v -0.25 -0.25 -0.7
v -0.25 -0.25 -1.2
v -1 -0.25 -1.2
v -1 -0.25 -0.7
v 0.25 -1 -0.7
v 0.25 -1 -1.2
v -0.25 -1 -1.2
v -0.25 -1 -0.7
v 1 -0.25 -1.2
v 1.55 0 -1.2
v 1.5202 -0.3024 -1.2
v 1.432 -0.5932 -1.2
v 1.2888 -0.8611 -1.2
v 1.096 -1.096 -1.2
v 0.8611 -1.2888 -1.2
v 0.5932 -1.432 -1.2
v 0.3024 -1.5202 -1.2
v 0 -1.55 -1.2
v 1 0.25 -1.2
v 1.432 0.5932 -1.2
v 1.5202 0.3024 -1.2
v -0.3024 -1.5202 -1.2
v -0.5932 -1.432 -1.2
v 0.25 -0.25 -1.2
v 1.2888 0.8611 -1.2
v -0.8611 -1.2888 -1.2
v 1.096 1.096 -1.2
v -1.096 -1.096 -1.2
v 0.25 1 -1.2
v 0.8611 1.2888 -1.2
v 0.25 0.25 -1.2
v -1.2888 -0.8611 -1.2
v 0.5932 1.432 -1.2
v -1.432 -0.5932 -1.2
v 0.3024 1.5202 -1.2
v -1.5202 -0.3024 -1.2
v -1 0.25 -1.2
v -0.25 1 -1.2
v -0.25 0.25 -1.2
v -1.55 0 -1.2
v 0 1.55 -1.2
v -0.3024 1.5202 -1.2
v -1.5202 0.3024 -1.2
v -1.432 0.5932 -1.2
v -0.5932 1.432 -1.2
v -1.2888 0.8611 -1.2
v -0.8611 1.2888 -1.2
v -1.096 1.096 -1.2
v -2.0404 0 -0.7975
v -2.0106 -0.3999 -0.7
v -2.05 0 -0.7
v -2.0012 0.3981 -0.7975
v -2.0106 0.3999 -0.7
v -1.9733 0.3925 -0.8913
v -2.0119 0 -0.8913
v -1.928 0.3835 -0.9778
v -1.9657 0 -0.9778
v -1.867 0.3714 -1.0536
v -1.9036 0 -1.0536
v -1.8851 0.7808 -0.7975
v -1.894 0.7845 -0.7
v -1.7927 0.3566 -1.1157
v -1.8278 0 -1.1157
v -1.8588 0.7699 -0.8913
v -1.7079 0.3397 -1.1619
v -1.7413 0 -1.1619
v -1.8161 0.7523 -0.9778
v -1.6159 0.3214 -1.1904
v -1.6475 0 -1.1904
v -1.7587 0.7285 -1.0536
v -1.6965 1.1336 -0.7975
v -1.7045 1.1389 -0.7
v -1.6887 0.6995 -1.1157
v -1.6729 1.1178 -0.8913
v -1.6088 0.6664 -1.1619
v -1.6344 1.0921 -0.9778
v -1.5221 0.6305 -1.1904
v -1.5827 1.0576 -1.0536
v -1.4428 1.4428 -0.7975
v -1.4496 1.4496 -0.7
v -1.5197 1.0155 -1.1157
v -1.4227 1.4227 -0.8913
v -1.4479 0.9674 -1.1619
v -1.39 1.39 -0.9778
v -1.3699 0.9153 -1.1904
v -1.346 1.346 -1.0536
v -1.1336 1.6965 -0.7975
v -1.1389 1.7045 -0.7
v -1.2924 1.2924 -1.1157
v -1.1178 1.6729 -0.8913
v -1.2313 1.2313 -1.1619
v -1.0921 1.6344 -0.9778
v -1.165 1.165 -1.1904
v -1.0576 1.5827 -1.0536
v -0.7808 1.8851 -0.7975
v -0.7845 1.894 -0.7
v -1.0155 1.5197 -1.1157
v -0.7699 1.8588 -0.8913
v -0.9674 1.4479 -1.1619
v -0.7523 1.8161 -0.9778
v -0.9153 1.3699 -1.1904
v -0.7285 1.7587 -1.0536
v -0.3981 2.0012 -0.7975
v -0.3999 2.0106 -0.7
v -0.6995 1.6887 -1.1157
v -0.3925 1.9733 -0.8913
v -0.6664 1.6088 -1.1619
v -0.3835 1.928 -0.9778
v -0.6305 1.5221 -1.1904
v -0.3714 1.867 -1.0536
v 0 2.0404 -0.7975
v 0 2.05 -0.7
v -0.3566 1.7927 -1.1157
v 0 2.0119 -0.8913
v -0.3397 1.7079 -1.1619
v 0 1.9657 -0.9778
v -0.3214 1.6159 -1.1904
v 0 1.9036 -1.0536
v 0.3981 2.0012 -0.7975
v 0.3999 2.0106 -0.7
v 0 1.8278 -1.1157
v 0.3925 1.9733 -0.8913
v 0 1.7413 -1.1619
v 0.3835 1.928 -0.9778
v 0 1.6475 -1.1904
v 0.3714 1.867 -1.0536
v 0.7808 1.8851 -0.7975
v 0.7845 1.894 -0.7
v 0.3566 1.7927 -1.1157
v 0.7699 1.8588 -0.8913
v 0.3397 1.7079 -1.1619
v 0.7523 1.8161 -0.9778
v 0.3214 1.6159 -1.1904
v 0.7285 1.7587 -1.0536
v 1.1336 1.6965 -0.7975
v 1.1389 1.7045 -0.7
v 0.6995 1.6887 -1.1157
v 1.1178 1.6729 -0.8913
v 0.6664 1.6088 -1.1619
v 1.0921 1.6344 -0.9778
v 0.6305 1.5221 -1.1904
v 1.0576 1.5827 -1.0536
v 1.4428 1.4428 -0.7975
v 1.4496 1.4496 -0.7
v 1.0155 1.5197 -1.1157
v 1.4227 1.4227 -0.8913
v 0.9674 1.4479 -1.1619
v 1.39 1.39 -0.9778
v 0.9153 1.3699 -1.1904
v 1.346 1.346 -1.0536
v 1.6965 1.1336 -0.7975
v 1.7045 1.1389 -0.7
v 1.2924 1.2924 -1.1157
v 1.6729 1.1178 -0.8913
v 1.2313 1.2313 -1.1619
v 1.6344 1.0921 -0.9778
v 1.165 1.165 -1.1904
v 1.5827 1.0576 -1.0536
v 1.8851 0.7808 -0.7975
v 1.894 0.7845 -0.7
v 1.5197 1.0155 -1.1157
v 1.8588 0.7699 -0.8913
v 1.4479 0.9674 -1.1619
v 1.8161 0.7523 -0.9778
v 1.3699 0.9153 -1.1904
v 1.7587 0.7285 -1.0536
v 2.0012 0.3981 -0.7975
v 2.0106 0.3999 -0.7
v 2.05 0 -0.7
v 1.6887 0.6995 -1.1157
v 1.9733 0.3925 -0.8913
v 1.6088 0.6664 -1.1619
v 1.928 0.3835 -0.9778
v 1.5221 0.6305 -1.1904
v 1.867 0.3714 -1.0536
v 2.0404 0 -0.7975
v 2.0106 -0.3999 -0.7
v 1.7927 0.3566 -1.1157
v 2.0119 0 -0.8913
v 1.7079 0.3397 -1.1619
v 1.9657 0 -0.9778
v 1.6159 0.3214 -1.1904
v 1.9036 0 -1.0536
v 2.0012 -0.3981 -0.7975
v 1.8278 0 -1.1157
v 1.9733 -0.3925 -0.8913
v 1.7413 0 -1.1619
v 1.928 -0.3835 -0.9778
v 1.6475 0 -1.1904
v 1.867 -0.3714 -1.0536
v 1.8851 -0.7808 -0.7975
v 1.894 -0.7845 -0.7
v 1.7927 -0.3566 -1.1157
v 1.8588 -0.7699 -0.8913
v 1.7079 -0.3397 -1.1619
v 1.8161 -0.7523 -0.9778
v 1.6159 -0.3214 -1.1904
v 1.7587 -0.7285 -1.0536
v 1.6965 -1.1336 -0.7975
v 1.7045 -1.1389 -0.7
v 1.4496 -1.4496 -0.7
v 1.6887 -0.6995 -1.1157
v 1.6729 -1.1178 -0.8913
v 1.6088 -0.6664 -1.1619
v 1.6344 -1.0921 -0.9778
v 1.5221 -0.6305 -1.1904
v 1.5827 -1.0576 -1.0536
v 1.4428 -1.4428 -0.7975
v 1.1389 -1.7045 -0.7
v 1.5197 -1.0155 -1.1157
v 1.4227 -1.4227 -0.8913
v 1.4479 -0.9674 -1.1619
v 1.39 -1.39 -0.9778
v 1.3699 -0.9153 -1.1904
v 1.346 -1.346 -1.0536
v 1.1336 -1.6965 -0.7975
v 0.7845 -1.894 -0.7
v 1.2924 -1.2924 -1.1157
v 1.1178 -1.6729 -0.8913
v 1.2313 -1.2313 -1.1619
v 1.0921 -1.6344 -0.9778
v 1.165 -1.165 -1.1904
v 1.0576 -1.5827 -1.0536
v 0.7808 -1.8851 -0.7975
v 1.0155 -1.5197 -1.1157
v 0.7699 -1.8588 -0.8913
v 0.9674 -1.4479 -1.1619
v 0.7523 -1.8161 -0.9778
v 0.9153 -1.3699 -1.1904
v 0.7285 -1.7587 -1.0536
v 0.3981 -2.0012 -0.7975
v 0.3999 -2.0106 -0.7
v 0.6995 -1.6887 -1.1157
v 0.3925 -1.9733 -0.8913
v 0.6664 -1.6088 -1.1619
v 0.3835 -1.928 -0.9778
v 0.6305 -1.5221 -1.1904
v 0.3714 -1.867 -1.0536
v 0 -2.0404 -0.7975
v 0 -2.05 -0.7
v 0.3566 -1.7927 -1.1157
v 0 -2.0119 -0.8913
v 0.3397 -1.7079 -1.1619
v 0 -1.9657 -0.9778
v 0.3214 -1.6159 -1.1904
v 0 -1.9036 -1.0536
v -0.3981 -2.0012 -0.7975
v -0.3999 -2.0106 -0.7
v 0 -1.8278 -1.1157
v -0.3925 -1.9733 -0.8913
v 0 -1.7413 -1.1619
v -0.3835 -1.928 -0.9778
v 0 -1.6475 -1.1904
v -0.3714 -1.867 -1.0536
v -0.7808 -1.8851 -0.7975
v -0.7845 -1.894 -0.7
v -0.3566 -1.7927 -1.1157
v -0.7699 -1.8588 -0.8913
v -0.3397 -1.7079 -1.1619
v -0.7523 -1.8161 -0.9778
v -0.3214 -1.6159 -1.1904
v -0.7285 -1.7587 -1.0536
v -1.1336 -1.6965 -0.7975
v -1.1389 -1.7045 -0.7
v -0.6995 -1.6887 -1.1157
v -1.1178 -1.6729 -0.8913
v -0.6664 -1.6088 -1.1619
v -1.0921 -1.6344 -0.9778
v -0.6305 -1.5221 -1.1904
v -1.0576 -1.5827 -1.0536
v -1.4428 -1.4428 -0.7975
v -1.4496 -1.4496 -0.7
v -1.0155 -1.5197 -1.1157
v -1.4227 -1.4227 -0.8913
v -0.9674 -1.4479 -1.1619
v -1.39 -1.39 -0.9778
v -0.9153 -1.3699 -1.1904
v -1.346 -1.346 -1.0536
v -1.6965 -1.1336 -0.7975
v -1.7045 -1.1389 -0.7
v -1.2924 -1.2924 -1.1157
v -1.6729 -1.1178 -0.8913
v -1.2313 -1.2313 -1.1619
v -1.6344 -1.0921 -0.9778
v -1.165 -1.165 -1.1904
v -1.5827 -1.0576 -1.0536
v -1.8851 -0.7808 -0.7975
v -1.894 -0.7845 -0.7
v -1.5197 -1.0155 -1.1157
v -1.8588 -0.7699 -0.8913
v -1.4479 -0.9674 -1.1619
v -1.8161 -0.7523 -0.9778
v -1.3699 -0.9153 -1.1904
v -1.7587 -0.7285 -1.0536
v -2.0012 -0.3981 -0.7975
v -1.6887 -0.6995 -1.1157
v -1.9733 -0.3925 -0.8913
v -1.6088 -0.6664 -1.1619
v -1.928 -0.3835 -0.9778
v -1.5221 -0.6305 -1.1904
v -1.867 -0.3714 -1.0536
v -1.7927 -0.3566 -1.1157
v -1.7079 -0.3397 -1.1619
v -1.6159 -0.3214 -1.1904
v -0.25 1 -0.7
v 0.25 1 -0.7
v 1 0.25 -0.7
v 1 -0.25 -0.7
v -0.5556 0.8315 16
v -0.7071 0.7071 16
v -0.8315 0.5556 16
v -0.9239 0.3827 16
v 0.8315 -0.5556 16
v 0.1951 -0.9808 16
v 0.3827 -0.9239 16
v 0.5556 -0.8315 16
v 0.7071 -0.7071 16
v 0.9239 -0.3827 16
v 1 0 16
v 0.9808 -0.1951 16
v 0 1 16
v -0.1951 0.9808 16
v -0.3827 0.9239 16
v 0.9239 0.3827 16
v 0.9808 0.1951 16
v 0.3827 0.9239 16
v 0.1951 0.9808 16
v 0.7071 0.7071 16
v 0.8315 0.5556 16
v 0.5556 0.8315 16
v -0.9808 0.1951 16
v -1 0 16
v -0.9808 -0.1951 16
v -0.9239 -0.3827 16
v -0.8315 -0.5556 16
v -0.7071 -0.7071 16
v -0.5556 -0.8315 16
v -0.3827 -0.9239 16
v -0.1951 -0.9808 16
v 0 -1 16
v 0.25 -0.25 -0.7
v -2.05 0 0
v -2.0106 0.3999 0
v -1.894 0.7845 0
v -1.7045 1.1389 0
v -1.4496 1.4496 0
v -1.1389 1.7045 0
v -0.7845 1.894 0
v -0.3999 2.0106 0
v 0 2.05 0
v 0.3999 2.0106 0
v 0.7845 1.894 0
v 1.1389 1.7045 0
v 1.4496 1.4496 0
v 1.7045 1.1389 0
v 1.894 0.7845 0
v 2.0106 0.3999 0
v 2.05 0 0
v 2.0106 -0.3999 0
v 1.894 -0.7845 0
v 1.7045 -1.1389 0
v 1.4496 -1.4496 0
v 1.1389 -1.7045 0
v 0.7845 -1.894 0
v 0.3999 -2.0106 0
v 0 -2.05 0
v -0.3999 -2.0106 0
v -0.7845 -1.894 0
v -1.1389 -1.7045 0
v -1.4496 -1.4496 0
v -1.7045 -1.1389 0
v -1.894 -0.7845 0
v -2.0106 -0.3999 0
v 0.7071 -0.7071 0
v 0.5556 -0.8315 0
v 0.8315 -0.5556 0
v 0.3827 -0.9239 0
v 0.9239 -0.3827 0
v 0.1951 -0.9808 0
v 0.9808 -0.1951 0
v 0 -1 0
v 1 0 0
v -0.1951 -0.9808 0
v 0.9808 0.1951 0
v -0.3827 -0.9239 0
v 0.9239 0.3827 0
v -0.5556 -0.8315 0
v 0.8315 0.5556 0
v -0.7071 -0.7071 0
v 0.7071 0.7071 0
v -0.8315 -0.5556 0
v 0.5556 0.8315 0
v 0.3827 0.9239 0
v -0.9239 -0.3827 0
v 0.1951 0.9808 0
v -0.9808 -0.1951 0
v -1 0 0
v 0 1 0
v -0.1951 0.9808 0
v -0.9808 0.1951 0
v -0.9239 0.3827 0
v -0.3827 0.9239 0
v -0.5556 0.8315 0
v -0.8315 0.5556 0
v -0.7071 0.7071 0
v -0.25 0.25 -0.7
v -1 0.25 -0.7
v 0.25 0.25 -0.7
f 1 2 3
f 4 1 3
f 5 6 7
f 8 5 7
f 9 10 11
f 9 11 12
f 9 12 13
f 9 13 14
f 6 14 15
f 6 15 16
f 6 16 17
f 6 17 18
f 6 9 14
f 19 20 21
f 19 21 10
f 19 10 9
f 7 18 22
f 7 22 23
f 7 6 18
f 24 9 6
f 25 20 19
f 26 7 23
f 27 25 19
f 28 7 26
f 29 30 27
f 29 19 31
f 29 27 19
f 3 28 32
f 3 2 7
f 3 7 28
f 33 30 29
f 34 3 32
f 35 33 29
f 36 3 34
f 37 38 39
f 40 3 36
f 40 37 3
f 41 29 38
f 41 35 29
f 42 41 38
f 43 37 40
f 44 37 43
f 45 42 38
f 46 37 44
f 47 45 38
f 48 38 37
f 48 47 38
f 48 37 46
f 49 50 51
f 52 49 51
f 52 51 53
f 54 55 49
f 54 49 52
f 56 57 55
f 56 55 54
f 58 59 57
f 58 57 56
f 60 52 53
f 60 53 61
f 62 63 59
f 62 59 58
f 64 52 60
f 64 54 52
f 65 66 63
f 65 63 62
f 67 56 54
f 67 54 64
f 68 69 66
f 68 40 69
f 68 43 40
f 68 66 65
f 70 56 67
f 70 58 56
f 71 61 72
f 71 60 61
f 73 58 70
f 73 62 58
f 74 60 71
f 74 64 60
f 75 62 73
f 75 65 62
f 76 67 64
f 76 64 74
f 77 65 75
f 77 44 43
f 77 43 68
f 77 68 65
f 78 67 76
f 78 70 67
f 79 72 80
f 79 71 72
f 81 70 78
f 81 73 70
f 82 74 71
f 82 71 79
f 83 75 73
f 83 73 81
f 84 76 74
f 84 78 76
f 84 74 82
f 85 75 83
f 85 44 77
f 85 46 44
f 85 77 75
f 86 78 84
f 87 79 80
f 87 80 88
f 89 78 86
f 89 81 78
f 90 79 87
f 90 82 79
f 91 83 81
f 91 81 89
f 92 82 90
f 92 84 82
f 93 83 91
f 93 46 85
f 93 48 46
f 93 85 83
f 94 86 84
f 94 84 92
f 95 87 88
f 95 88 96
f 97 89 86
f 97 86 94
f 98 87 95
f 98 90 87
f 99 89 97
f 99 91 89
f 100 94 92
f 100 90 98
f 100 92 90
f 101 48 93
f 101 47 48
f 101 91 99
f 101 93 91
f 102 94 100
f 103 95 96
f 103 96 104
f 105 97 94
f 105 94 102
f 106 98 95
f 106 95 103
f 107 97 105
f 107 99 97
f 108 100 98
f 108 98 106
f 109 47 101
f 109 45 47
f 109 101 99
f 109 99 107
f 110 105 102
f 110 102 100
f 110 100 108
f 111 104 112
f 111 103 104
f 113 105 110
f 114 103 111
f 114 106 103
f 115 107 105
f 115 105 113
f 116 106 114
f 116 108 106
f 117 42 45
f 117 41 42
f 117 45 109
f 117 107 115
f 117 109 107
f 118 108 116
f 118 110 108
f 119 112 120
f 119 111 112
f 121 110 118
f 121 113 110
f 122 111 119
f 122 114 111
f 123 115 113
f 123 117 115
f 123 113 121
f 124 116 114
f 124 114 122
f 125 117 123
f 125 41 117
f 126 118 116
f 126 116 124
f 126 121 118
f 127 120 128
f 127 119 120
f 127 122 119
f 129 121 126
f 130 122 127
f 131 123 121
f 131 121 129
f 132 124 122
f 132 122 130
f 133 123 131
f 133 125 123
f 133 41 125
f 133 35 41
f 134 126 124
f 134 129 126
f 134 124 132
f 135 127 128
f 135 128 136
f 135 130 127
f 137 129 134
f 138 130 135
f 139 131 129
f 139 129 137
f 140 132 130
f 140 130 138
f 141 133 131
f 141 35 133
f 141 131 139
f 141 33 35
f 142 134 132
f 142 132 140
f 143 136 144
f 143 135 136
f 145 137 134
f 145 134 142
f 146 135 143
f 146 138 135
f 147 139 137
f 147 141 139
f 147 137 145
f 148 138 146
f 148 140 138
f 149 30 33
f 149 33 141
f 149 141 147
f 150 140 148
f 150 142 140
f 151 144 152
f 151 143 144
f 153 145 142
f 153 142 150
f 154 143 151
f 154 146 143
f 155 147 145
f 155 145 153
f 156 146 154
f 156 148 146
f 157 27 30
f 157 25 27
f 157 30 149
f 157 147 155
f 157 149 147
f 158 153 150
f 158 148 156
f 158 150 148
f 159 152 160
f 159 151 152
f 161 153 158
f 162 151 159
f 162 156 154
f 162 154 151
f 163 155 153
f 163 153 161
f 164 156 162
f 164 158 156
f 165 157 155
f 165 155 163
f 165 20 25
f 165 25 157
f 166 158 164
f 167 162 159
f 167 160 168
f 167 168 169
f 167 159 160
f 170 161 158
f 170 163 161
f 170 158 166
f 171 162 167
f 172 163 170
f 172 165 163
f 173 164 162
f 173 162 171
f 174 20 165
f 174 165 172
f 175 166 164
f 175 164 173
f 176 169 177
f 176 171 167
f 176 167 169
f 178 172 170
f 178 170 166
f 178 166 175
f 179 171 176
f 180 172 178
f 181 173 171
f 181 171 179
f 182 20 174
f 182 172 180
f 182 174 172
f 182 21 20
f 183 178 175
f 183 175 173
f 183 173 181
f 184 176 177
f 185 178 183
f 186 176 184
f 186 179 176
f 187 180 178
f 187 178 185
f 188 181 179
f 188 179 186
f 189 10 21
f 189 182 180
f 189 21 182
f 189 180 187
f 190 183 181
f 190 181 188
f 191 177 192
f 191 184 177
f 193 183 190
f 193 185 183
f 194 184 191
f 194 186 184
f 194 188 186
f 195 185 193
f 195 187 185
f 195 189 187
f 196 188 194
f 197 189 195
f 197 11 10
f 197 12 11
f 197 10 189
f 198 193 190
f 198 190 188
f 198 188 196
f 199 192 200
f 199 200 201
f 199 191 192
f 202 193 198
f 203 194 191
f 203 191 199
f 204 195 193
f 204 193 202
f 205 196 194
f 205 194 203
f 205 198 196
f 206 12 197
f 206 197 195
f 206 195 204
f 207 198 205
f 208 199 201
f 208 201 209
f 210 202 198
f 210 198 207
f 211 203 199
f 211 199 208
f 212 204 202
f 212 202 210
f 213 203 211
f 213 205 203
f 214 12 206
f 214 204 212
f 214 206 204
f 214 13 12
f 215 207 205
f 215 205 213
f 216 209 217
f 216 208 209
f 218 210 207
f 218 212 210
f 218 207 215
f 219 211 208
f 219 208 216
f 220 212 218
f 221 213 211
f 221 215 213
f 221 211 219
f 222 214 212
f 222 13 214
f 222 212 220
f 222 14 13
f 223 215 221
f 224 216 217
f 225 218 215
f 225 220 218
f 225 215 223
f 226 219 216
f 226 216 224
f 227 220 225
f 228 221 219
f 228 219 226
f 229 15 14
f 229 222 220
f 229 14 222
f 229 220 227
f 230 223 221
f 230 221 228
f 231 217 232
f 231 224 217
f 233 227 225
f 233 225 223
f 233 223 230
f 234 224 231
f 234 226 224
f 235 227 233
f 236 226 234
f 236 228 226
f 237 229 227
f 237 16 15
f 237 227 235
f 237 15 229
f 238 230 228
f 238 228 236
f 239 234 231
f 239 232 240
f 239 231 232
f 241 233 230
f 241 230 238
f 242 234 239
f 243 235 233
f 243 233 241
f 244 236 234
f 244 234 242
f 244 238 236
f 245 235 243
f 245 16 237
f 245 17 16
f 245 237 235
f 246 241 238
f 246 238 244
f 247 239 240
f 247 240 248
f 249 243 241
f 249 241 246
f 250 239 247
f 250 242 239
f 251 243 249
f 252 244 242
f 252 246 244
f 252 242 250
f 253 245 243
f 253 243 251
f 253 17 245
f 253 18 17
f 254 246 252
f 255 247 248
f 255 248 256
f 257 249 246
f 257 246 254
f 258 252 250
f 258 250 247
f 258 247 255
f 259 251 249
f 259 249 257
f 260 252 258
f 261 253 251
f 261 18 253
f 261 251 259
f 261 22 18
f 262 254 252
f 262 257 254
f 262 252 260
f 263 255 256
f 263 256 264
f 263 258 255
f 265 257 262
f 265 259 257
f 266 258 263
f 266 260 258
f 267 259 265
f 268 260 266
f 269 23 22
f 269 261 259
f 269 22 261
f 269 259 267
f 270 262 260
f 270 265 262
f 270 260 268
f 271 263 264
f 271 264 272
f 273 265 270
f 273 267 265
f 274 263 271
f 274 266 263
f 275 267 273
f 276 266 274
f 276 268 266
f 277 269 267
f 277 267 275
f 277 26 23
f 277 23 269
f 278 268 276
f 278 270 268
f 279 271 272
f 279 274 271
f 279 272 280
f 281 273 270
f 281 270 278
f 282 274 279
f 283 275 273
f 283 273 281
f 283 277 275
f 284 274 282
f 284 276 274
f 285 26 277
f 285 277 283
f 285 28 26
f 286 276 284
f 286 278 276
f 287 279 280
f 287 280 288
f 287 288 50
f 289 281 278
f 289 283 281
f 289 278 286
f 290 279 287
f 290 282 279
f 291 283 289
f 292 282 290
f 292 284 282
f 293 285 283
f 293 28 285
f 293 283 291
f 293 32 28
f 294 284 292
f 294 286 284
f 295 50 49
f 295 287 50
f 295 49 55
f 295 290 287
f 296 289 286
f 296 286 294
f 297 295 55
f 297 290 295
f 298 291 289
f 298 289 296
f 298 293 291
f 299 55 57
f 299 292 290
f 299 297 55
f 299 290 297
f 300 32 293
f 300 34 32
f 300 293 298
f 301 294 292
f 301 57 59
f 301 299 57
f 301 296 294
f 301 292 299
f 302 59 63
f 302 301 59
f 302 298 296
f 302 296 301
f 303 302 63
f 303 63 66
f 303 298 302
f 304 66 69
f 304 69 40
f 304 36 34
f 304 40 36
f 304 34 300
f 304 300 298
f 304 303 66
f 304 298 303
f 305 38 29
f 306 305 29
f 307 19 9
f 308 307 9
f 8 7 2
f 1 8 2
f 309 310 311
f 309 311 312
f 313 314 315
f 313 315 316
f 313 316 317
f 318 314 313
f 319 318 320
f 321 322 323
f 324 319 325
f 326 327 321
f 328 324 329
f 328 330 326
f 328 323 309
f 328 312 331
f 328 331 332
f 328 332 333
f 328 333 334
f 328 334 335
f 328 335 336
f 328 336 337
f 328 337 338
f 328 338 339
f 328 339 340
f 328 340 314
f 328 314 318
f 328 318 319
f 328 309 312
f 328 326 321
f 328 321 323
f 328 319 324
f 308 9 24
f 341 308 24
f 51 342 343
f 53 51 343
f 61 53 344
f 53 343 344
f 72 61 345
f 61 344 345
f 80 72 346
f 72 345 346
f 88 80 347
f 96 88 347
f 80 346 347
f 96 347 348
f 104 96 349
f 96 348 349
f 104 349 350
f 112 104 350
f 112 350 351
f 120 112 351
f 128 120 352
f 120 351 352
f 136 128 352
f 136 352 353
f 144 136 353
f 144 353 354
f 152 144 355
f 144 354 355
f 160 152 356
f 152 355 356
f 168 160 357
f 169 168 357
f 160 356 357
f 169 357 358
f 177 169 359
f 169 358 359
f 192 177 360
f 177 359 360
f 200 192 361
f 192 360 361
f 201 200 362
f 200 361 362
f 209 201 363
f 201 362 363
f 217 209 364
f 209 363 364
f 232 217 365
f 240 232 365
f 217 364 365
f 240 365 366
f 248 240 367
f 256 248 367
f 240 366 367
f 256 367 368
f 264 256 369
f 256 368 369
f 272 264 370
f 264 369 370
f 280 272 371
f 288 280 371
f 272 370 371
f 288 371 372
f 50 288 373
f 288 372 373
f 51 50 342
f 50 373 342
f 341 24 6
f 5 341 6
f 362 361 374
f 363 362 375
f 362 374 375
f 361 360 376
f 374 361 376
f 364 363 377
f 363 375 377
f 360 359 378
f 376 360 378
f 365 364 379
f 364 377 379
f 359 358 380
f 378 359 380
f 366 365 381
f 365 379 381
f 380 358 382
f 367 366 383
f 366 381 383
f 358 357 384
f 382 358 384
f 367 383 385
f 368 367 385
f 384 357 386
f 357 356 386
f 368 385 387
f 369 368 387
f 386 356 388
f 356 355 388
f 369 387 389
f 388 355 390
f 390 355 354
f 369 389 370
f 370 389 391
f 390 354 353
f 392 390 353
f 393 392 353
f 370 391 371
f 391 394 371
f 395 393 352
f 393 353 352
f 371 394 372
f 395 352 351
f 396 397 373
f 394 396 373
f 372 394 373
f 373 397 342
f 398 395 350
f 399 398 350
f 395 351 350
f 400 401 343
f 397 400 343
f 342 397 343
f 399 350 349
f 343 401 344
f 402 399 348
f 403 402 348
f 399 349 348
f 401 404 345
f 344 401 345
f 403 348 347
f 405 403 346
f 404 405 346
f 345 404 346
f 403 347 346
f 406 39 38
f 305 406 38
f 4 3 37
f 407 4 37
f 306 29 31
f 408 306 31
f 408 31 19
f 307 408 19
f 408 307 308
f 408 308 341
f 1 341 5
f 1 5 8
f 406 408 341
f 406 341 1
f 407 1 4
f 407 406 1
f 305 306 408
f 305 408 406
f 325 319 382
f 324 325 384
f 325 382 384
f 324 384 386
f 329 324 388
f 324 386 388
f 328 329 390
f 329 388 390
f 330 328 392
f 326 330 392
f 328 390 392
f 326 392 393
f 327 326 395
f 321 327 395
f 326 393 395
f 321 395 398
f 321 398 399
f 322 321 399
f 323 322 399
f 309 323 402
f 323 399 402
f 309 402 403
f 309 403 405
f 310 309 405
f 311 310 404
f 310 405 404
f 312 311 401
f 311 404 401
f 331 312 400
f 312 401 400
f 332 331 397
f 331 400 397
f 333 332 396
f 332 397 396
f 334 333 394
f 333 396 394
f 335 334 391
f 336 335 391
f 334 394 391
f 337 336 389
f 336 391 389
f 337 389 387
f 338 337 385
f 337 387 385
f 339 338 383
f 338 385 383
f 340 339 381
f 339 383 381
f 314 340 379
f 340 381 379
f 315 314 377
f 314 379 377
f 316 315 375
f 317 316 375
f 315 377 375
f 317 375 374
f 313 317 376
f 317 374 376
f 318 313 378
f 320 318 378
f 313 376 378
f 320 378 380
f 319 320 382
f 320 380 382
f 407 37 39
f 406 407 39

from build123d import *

# Parameters (mm, degrees)
SCHIZZO1_R                   = 1
ESTRUSIONE_ESTRUSIONE1_DEPTH = 16
SCHIZZO2_R                   = 2.05
ESTRUSIONE_ESTRUSIONE2_DEPTH = 1.2
RACCORDO1_R                  = 0.5
TAGLIO_ESTRUSIONE1_DEPTH     = 0.5


with BuildPart() as part:
    # Schizzo1 → Estrusione-Estrusione1 (new body)
    with BuildSketch(Plane.XY):
        Circle(SCHIZZO1_R)
    extrude(amount=ESTRUSIONE_ESTRUSIONE1_DEPTH)

    # Schizzo2 → Estrusione-Estrusione2 (add)
    with BuildSketch(Plane(origin=(0, 0, 0), x_dir=(-1, 0, 0), z_dir=(0, 0, -1))):
        Circle(SCHIZZO2_R)
    extrude(amount=ESTRUSIONE_ESTRUSIONE2_DEPTH)

    # Raccordo1
    raccordo1_edges = [part.edges().sort_by_distance(p)[0] for p in [
        (2.05, 0, -1.2),
    ]]
    fillet(raccordo1_edges, radius=RACCORDO1_R)

    # Schizzo3 → Taglio-Estrusione1 (cut)
    with BuildSketch(Plane(origin=(0, 0, -1.2), x_dir=(-1, 0, 0), z_dir=(0, 0, -1))):
        Polygon((-0.25, 0.25), (-1, 0.25), (-1, -0.25), (-0.25, -0.25), (-0.25, -1), (0.25, -1), (0.25, -0.25), (1, -0.25), (1, 0.25), (0.25, 0.25), (0.25, 1), (-0.25, 1), align=None)
    extrude(amount=-TAGLIO_ESTRUSIONE1_DEPTH, mode=Mode.SUBTRACT)


solid = part.part
